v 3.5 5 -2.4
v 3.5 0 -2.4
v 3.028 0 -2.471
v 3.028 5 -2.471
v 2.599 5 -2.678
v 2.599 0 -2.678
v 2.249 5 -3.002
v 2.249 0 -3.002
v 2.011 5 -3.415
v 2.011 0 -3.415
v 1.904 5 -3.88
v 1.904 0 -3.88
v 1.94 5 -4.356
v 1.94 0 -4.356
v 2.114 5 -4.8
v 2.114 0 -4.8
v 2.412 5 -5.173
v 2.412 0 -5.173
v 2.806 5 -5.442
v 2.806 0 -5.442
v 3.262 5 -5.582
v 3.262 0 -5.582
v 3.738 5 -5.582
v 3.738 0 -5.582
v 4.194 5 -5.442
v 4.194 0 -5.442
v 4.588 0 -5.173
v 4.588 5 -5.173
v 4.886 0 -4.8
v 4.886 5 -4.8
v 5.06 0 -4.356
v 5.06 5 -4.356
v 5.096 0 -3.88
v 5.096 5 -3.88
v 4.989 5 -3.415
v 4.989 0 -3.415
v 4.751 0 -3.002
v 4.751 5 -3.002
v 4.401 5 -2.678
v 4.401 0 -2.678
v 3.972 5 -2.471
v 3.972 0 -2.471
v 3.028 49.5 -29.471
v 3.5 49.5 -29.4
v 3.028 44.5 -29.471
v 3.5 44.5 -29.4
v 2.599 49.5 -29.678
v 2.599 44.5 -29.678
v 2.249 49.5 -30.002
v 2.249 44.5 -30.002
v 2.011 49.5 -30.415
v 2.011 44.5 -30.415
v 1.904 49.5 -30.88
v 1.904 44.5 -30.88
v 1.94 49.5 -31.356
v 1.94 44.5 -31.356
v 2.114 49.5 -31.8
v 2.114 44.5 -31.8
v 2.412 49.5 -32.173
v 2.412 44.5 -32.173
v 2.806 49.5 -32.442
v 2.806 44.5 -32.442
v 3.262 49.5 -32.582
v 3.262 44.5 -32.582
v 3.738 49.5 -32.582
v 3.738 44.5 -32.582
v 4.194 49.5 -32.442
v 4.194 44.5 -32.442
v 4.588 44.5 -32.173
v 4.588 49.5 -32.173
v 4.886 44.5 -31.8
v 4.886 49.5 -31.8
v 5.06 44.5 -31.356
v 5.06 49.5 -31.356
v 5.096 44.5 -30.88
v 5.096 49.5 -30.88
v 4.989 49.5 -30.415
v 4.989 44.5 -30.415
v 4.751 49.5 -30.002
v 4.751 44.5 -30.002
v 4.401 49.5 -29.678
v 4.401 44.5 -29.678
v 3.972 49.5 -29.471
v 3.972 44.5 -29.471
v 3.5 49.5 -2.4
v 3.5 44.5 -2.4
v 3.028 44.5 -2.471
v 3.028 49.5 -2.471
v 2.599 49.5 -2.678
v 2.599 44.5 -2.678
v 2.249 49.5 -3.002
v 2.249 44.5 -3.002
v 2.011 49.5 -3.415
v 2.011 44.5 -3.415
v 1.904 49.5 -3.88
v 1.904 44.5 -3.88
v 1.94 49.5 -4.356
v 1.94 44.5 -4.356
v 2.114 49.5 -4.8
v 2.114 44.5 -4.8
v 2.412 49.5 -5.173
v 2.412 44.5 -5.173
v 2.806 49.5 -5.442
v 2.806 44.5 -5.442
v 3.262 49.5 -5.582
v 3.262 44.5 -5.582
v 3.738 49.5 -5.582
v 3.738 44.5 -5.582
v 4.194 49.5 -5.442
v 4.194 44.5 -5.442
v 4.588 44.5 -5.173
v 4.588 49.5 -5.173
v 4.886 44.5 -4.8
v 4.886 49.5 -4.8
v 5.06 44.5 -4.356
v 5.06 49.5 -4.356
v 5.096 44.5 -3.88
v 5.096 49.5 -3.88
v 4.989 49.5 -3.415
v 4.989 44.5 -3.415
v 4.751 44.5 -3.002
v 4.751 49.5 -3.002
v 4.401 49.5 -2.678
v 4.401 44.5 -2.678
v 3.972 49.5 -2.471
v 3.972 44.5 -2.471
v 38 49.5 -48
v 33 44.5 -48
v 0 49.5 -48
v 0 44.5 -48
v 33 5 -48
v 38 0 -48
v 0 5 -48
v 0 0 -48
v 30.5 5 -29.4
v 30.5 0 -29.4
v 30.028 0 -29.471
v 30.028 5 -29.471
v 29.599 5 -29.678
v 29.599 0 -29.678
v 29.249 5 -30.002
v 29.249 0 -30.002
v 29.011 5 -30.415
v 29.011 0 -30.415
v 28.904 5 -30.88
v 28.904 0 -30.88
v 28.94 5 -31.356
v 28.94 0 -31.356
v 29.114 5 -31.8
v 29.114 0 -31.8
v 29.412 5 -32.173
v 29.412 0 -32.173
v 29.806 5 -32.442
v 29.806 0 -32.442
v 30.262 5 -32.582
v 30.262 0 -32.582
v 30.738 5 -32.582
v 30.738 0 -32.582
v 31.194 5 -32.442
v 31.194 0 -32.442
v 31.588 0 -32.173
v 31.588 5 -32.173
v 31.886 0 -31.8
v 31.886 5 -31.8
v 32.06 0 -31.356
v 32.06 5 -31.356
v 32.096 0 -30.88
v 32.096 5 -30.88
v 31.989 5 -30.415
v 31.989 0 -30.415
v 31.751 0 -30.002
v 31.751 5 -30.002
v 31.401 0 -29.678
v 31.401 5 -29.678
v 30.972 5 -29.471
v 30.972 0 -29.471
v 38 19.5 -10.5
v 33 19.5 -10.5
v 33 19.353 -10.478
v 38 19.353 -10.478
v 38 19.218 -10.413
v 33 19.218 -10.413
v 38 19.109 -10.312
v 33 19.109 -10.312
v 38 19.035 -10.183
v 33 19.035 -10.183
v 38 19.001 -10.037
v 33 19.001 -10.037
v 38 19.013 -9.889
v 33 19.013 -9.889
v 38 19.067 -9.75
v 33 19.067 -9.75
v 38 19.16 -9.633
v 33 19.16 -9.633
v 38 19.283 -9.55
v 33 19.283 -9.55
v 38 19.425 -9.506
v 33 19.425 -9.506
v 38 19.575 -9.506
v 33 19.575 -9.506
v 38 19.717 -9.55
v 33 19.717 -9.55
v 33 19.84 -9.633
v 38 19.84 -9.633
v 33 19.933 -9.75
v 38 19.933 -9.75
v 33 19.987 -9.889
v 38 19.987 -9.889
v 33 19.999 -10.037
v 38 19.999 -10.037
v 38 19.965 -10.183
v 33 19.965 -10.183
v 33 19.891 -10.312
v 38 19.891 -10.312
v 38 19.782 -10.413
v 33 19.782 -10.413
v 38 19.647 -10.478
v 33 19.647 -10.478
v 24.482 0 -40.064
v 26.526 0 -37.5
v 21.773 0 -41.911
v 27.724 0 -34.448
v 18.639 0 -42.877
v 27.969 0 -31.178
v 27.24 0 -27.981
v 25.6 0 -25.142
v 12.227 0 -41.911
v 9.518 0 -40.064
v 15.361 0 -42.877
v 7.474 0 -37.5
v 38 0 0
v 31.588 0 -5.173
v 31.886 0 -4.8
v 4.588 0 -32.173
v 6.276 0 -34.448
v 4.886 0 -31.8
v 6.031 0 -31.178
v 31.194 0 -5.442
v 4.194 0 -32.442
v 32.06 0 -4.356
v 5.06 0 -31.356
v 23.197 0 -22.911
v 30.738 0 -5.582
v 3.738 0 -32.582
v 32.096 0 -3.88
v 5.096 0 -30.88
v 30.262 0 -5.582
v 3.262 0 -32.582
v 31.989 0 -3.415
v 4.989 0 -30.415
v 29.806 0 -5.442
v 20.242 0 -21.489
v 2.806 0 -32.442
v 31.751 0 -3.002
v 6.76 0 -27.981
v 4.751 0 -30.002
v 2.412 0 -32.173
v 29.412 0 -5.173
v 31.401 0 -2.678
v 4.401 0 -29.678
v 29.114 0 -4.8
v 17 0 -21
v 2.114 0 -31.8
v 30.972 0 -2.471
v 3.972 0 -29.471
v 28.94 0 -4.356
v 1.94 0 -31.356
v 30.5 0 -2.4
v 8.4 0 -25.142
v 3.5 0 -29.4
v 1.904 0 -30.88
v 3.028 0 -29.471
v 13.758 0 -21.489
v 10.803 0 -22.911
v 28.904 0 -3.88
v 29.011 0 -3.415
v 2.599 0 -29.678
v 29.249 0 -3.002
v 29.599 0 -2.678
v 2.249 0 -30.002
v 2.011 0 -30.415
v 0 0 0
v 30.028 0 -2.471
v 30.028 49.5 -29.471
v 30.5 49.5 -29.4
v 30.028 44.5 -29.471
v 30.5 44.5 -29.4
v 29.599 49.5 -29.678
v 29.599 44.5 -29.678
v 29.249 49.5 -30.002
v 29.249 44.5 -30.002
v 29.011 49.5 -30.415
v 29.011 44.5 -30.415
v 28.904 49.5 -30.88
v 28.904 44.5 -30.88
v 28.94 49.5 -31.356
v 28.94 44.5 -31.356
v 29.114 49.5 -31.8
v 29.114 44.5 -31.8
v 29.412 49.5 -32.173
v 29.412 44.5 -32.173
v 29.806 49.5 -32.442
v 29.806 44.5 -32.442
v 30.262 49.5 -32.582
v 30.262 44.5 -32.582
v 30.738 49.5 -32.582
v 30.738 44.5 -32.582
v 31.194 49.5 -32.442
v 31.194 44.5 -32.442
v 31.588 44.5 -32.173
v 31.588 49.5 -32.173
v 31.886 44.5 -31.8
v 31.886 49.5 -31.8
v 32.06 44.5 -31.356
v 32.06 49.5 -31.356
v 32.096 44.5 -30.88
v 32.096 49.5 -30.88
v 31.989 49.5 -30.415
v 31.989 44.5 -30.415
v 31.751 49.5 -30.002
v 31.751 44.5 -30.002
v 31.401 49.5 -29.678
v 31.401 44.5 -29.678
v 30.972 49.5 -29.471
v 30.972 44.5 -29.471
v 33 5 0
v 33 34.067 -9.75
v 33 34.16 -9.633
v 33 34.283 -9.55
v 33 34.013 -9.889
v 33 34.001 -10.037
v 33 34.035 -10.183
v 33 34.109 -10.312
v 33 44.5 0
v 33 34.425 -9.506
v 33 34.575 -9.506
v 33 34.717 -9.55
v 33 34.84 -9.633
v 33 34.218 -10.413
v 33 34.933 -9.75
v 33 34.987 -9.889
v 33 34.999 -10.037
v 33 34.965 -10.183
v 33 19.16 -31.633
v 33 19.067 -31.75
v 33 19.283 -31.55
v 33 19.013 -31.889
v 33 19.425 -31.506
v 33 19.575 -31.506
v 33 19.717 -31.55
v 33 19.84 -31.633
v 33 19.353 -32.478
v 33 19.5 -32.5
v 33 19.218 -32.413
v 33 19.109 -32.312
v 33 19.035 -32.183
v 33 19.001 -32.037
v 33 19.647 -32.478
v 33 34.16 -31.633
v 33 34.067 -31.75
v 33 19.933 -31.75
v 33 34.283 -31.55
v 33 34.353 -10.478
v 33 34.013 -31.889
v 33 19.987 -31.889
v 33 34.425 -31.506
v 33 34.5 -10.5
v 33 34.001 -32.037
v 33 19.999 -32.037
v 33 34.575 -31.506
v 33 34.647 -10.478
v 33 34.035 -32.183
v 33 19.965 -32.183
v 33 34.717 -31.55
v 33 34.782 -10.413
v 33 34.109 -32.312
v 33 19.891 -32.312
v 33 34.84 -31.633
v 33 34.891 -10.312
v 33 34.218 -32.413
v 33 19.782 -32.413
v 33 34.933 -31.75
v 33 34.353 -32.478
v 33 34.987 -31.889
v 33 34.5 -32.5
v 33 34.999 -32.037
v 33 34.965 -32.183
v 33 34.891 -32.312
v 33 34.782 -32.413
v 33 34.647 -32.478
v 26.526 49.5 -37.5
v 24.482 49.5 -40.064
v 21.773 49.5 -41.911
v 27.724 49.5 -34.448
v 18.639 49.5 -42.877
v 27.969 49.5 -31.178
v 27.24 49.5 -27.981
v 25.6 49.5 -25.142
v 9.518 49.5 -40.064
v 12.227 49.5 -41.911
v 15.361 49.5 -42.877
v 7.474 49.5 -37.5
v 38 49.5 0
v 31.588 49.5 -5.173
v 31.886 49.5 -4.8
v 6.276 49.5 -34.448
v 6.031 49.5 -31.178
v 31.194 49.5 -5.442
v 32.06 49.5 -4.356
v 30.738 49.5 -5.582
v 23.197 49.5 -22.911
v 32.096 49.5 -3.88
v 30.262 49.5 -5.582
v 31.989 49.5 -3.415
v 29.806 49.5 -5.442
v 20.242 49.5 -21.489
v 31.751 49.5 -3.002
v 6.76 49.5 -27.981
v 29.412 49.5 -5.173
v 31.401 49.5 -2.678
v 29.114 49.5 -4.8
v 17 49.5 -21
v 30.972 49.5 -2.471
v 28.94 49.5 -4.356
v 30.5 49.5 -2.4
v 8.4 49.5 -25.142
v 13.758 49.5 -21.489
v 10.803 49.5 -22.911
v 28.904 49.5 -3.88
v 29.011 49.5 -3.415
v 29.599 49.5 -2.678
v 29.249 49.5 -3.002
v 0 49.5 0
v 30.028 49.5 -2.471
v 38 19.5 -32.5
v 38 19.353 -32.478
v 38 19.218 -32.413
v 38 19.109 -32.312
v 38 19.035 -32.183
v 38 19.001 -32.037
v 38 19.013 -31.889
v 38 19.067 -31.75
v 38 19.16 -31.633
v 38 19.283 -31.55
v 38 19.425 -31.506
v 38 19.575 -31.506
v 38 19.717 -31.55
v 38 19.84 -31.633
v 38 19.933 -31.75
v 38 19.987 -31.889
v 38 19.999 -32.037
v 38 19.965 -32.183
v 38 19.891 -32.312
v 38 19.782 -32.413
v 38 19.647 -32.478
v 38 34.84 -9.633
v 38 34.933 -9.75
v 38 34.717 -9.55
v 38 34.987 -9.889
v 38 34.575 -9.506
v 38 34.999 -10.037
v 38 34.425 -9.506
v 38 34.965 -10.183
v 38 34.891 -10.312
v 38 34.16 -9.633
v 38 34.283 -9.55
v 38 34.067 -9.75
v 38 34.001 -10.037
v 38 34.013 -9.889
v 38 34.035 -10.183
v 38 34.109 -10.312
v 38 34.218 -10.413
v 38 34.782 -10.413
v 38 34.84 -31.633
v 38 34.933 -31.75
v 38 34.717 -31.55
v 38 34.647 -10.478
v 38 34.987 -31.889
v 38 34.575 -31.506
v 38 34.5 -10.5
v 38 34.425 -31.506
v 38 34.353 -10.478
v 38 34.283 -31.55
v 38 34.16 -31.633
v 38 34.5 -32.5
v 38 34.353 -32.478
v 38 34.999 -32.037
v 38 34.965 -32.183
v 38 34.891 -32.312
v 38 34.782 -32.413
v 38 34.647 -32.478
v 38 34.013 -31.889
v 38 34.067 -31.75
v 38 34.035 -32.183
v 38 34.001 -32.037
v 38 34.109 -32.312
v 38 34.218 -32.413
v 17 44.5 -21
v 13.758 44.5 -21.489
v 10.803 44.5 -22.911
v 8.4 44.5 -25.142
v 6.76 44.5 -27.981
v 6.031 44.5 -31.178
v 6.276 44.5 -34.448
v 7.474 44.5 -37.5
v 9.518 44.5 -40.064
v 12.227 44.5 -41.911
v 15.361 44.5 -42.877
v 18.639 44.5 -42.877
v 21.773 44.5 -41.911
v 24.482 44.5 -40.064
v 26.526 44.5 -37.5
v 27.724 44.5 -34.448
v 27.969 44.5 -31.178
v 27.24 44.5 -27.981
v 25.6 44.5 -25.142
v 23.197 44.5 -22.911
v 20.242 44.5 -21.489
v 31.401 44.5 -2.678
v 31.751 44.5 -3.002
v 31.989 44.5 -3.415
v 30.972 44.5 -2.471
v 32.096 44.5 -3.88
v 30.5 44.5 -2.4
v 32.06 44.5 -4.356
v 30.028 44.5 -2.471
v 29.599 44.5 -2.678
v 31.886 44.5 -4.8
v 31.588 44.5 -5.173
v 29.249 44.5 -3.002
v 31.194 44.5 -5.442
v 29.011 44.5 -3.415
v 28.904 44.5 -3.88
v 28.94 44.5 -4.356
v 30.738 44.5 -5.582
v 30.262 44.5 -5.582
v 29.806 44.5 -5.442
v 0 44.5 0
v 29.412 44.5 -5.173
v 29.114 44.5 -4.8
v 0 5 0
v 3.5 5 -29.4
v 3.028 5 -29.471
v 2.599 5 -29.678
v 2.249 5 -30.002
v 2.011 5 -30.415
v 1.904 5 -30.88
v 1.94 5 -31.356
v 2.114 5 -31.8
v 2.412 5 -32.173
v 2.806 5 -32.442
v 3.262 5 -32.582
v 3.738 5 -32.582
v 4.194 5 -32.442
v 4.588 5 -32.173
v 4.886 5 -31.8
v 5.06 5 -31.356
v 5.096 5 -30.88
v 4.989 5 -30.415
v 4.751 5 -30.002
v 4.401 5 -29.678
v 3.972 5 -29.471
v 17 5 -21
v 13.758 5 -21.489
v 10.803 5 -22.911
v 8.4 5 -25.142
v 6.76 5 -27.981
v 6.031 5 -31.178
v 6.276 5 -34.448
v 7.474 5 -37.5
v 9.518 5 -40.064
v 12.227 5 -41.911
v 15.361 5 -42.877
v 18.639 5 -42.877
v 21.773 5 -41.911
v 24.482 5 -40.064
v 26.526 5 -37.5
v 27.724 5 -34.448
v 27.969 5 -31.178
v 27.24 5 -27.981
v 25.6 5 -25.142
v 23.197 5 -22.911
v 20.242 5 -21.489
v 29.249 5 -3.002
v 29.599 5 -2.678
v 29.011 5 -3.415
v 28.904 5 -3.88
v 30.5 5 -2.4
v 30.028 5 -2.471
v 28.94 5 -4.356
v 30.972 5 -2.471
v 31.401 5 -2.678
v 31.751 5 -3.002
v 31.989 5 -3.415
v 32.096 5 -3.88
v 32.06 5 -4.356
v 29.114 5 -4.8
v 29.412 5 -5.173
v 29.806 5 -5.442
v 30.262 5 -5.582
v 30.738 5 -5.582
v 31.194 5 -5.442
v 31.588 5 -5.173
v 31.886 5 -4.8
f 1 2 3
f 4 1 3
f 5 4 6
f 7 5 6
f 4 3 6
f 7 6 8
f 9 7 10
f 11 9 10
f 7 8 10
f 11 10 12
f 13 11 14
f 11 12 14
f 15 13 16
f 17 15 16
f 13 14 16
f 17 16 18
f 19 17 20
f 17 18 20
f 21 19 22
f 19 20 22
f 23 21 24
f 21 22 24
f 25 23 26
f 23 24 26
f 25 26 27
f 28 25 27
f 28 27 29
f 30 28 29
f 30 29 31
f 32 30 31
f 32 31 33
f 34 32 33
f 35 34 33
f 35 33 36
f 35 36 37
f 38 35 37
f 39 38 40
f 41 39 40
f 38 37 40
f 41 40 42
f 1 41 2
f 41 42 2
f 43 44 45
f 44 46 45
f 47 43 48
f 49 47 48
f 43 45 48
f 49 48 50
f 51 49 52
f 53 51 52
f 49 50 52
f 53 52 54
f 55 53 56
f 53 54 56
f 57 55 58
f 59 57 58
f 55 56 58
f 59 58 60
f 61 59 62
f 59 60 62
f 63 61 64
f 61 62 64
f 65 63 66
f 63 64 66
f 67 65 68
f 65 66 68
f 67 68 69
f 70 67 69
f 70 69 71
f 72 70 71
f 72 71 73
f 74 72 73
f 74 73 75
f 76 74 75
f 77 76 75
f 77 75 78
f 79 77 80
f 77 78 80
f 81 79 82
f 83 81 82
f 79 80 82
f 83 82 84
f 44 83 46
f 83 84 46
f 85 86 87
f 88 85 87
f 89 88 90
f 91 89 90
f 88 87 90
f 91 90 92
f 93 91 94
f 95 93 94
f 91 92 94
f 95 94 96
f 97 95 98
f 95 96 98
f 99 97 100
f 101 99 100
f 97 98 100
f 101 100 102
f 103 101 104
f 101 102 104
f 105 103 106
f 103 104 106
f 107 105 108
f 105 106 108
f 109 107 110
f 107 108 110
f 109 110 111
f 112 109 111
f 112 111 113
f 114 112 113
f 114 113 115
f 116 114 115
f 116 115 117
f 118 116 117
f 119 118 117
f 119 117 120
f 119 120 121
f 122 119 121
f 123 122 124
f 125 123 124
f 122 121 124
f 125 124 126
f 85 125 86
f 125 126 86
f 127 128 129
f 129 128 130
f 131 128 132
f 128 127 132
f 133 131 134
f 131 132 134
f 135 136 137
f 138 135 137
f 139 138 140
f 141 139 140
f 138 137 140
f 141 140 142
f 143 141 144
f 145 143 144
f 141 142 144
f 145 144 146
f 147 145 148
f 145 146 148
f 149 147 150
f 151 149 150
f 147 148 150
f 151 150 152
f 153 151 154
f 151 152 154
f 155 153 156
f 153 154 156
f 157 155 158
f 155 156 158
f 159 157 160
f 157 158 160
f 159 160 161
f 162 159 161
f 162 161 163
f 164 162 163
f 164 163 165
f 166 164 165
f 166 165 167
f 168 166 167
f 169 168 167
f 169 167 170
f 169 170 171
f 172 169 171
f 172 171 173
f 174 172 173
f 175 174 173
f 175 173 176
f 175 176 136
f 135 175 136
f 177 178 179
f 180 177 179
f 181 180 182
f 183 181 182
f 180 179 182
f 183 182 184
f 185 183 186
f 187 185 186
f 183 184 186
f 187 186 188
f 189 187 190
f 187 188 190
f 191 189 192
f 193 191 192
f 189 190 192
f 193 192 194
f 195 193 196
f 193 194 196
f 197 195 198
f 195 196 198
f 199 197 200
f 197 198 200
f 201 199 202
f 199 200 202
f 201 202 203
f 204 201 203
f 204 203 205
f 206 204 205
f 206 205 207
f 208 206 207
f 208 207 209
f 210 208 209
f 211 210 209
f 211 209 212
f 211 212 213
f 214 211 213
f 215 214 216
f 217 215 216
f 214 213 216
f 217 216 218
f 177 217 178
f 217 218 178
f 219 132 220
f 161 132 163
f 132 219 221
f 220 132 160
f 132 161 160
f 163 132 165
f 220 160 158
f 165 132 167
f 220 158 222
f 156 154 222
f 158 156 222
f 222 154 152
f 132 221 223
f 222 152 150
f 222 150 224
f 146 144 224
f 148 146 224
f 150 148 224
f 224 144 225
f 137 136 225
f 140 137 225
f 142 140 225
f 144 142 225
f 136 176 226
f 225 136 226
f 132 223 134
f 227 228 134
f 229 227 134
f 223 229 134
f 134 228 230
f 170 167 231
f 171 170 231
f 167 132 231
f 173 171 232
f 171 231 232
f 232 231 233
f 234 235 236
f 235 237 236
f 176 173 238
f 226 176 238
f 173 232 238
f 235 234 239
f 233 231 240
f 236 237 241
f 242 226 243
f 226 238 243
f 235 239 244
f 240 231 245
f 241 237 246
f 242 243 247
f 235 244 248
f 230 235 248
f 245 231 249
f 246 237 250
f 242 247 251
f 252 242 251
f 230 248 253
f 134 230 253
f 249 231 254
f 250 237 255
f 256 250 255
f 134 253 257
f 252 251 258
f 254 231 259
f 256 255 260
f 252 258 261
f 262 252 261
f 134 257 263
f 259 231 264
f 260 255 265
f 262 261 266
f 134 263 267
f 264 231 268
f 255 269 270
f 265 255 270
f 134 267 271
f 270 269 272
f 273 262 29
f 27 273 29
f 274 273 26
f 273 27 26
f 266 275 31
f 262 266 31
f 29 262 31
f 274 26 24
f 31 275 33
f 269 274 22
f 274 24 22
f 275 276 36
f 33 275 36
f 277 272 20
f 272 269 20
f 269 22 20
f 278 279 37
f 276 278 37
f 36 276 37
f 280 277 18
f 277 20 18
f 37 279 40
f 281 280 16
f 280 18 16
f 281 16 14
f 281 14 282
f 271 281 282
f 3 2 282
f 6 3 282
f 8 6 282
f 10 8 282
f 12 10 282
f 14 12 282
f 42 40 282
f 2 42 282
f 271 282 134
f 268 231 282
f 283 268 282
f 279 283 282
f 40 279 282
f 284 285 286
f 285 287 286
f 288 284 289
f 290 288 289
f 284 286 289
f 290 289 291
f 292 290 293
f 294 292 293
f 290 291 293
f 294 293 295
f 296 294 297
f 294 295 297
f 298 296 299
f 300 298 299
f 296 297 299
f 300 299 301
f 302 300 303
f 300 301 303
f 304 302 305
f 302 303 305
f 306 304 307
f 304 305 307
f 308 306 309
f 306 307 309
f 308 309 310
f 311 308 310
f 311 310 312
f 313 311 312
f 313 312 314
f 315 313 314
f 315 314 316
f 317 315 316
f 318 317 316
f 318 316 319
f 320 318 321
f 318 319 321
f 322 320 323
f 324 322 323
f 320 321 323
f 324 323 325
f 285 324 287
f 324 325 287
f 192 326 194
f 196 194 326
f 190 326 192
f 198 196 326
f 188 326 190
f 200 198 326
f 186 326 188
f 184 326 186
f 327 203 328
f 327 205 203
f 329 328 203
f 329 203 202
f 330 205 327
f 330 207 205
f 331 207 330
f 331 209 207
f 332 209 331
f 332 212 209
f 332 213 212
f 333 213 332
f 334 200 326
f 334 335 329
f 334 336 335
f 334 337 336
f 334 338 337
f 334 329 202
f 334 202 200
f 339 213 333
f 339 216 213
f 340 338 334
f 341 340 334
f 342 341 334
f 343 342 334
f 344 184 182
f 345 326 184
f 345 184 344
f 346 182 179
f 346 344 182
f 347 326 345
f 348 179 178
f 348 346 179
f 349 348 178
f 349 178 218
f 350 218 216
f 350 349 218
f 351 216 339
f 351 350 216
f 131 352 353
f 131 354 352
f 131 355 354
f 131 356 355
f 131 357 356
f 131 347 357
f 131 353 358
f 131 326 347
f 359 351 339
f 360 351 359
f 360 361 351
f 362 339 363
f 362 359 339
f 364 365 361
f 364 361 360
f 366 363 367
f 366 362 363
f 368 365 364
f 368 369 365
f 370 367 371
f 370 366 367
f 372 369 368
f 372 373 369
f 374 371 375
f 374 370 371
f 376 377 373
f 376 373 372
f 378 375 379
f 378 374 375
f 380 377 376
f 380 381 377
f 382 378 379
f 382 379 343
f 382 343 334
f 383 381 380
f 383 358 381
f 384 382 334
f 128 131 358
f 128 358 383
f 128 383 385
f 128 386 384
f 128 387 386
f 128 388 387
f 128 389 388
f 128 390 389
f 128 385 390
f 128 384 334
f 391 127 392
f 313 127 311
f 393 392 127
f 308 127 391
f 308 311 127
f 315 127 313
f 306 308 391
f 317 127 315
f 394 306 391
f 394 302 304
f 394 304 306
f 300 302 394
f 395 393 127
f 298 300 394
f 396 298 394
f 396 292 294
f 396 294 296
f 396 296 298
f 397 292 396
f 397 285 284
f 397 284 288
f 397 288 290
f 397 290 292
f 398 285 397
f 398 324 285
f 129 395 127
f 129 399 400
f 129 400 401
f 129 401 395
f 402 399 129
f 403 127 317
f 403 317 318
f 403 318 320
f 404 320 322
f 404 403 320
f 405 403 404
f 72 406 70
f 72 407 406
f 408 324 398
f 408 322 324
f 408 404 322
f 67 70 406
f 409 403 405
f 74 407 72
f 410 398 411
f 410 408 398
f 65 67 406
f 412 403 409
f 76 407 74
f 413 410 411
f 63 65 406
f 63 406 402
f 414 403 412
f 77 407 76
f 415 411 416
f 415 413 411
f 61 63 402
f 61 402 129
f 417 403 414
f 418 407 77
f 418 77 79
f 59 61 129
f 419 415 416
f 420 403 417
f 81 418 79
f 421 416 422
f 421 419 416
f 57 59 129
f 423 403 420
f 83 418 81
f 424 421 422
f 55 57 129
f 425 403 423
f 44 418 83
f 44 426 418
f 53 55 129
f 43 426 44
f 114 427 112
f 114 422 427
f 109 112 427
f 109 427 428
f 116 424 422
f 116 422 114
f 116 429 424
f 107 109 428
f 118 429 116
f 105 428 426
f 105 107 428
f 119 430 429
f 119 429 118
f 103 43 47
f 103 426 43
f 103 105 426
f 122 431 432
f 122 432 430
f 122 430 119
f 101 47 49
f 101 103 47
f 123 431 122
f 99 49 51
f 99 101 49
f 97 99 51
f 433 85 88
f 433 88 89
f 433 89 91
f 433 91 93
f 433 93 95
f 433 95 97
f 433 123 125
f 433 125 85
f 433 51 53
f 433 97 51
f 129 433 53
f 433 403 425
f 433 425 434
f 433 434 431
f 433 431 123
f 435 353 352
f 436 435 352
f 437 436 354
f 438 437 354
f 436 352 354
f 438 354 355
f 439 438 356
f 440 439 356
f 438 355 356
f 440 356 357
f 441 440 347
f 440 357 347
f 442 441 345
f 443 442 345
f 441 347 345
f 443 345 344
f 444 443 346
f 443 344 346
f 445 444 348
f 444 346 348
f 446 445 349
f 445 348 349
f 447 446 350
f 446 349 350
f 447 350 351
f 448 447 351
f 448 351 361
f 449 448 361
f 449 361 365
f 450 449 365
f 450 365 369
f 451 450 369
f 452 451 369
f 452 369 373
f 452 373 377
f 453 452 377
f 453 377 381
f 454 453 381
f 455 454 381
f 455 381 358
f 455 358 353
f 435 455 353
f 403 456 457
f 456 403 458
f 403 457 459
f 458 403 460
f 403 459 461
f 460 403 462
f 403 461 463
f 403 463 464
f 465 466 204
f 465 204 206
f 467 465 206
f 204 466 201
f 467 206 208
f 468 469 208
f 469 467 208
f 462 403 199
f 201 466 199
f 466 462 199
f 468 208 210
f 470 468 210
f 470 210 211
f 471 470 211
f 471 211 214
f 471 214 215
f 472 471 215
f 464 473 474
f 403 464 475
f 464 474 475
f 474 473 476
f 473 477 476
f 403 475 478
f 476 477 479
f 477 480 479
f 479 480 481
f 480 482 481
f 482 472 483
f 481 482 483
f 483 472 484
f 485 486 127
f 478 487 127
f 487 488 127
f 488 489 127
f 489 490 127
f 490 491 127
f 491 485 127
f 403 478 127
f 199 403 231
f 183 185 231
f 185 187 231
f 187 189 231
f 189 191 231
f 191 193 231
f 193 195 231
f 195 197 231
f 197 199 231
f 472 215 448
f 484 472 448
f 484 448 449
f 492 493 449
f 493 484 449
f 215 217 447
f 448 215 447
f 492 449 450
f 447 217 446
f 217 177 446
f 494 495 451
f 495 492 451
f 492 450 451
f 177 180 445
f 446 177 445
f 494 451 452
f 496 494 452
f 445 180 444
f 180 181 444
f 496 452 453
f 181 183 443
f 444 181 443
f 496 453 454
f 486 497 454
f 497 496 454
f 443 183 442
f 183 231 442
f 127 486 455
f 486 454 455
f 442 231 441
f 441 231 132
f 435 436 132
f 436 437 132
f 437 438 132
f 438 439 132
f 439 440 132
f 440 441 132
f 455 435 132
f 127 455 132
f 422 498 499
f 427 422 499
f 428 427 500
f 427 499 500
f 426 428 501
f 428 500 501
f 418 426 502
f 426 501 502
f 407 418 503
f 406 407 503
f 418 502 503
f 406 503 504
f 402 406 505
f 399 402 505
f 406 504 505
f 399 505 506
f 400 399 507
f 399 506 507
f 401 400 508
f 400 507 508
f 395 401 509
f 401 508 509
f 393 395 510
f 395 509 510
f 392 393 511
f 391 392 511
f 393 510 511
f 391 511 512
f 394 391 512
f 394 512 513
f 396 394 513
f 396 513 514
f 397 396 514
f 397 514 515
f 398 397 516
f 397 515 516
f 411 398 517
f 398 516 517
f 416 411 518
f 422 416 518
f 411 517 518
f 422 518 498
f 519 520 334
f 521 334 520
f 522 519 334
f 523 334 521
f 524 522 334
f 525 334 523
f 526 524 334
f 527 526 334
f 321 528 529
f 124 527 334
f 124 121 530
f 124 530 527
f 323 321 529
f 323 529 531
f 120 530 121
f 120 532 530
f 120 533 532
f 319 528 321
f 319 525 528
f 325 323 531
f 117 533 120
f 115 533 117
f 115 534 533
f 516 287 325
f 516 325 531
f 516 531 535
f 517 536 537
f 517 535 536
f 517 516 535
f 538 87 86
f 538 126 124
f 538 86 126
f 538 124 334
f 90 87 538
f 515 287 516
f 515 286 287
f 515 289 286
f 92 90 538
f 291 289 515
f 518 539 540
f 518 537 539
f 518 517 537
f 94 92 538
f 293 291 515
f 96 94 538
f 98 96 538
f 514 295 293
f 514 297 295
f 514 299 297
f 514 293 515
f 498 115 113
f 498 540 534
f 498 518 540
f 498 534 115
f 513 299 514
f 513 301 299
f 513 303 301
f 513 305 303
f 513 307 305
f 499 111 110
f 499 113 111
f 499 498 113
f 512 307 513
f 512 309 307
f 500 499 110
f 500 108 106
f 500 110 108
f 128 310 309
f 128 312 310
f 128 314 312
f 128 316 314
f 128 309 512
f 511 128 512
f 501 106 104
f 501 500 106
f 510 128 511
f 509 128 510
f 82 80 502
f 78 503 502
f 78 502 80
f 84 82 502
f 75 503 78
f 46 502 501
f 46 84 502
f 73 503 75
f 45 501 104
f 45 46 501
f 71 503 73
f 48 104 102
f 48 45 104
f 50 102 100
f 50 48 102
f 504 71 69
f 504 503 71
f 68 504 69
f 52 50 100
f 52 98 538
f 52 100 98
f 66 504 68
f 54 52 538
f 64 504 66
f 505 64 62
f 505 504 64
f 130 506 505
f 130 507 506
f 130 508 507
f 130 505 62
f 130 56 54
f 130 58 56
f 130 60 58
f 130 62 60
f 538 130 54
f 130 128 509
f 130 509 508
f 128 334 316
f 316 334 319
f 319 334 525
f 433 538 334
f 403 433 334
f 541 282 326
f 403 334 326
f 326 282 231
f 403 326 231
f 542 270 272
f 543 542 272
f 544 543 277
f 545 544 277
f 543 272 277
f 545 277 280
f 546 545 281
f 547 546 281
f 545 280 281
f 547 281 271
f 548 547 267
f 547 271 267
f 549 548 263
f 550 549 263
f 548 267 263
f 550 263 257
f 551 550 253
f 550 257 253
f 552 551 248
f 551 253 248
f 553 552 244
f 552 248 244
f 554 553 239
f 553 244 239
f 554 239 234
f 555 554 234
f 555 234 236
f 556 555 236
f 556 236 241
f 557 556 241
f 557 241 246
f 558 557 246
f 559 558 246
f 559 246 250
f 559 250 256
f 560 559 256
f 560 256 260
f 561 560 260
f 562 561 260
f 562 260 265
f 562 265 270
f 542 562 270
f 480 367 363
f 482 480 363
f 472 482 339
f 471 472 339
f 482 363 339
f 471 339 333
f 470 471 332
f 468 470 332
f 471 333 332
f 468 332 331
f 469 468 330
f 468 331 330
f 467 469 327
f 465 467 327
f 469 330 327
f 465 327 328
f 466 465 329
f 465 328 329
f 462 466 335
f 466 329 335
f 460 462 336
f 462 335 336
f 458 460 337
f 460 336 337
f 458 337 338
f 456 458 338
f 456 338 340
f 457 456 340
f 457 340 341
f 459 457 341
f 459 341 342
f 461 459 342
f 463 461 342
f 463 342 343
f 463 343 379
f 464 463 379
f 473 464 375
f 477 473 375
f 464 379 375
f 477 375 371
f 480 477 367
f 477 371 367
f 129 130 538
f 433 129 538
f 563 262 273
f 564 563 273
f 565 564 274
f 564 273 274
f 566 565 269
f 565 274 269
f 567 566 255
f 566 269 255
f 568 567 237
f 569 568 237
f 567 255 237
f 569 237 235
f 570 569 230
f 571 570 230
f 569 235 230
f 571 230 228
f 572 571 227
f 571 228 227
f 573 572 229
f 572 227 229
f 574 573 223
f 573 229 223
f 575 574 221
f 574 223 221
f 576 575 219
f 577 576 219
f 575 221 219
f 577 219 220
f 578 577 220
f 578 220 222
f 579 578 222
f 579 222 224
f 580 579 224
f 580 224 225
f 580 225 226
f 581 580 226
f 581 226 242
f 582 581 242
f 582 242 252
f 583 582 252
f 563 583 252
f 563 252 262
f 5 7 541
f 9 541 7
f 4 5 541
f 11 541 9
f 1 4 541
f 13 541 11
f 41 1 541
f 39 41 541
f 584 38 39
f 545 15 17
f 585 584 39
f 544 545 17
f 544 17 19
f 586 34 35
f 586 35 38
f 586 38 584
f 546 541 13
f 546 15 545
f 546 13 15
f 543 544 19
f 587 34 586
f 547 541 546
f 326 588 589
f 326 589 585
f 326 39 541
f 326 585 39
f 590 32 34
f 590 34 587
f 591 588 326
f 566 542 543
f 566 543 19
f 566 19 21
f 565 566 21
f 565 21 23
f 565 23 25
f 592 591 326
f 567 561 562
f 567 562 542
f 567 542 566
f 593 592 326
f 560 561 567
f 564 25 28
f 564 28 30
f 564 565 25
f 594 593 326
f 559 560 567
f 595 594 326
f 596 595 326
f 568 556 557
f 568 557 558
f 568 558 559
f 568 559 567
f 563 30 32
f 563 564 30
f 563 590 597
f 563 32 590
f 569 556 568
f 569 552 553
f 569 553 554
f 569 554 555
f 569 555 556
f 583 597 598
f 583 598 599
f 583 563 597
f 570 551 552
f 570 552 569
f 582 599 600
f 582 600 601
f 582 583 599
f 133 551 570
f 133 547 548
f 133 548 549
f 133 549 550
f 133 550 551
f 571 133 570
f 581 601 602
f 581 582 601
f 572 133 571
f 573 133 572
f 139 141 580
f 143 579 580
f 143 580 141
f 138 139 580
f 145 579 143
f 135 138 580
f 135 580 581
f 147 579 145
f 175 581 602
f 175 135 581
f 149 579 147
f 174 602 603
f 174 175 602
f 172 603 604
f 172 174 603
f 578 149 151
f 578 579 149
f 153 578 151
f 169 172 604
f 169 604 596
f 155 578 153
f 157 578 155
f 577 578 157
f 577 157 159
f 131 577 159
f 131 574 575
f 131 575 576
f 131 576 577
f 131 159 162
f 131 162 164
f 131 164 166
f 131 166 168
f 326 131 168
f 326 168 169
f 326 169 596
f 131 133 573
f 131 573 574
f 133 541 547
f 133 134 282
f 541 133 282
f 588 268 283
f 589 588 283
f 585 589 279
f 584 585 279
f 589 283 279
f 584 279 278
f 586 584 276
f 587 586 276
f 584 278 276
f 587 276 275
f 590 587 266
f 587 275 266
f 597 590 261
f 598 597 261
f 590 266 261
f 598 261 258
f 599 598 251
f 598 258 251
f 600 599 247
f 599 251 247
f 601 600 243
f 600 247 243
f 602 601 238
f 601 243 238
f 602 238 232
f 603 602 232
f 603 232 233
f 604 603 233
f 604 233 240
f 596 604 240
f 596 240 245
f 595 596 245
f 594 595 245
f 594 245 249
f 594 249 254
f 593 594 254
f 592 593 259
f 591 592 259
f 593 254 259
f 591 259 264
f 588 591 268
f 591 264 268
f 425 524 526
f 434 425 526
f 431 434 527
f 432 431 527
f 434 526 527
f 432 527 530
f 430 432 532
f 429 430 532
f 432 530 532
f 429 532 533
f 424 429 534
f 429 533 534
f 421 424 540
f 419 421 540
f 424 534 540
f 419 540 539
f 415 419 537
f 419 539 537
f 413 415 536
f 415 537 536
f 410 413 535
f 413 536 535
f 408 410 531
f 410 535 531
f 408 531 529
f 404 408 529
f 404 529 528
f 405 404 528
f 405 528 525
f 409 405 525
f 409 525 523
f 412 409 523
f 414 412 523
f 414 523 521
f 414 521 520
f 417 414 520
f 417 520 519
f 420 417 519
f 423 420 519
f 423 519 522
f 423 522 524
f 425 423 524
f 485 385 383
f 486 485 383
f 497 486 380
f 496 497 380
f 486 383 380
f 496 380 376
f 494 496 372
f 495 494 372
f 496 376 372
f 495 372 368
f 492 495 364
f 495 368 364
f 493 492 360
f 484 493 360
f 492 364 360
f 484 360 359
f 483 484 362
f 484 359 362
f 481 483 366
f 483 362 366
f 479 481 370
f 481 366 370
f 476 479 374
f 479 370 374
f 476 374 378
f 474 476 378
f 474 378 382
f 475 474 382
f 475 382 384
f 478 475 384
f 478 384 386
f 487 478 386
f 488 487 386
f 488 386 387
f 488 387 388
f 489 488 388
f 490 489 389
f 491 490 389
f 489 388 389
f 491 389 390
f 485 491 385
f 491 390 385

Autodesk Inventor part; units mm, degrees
ref_plane "YZ Plane" through (0, 0, 0) normal (1, 0, 0) x (0, 1, 0)
ref_plane "XZ Plane" through (0, 0, 0) normal (0, 1, 0) x (-1, 0, 0)
ref_plane "XY Plane" through (0, 0, 0) normal (0, 0, 1) x (1, 0, 0)
sketch "スケッチ1" plane through (0, 0, 0) normal (0, 1, 0) x (-1, 0, 0)
  line L0 (0, 0) -> (-38, 0)
  line L1 (-38, 0) -> (-38, -48)
  line L2 (-38, -48) -> (0, -48)
  line L3 (0, -48) -> (0, 0)
  dimension "d0" = 48
  dimension "d1" = 38
extrude "押し出し1" add sketch "スケッチ1" along normal blind 49.5
sketch "スケッチ2" plane through (38, 0, -48) normal (0, 0, -1) x (-1, 0, 0)
  line L0 (5, 44.5) -> (59.072, 44.5)
  line L1 (59.072, 44.5) -> (59.072, 5)
  line L2 (59.072, 5) -> (5, 5)
  line L3 (5, 5) -> (5, 44.5)
  line L4 (0, 49.5) -> (38, 49.5) projected
  line L5 (0, 0) -> (38, 0) projected
  line L6 (0, 0) -> (0, 49.5) projected
  dimension "d4" = 39.5
  dimension "d6" = 5
  dimension "d7" = 5
extrude "押し出し2" cut sketch "スケッチ2" against normal blind 100
sketch "スケッチ3" plane through (0, 49.5, 0) normal (0, 1, 0) x (1, 0, 0)
  line L0 (38, 48) -> (0, 48) projected
  line L1 (38, 0) -> (38, 48) projected
  point P0 (0, 0)
  point P1 (17, 32)
  dimension "d10" = 16
  dimension "d11" = 21
hole "穴1" at (17, 49.5, -32) direction (0, -1, 0) diameter 22 end through all
sketch "スケッチ4" plane through (0, 49.5, 0) normal (0, 1, 0) x (1, 0, 0)
  line L0 (0, 0) -> (38, 0) projected
  line L1 (38, 0) -> (38, 48) projected
  point P0 (30.5, 4)
  point P1 (30.5, 31)
  point P2 (3.5, 4)
  point P3 (3.5, 31)
  point P4 (3.5, 4)
  dimension "d19" = 4
  dimension "d20" = 7.5
  dimension "d23" = 27
  dimension "d26" = 27
hole "穴2" at (30.5, 49.5, -4) at (30.5, 49.5, -31) at (3.5, 49.5, -31) at (3.5, 49.5, -4) direction (0, -1, 0) diameter 3.2 end through all
sketch "スケッチ6" plane through (38, 0, 0) normal (1, 0, 0) x (0, 0, -1)
  line L0 (0, 49.5) -> (48, 49.5) projected
  line L1 (0, 0) -> (0, 49.5) projected
  point P0 (10, 34.5)
  point P1 (32, 34.5)
  point P2 (10, 19.5)
  point P3 (32, 19.5)
  dimension "d45" = 15
  dimension "d46" = 10
  dimension "d49" = 22
  dimension "d52" = 15
hole "穴4" at (38, 34.5, -10) at (38, 34.5, -32) at (38, 19.5, -10) at (38, 19.5, -32) direction (-1, 0, 0) diameter 1 end through all
properties part number "サーボモータ固定２軸"
